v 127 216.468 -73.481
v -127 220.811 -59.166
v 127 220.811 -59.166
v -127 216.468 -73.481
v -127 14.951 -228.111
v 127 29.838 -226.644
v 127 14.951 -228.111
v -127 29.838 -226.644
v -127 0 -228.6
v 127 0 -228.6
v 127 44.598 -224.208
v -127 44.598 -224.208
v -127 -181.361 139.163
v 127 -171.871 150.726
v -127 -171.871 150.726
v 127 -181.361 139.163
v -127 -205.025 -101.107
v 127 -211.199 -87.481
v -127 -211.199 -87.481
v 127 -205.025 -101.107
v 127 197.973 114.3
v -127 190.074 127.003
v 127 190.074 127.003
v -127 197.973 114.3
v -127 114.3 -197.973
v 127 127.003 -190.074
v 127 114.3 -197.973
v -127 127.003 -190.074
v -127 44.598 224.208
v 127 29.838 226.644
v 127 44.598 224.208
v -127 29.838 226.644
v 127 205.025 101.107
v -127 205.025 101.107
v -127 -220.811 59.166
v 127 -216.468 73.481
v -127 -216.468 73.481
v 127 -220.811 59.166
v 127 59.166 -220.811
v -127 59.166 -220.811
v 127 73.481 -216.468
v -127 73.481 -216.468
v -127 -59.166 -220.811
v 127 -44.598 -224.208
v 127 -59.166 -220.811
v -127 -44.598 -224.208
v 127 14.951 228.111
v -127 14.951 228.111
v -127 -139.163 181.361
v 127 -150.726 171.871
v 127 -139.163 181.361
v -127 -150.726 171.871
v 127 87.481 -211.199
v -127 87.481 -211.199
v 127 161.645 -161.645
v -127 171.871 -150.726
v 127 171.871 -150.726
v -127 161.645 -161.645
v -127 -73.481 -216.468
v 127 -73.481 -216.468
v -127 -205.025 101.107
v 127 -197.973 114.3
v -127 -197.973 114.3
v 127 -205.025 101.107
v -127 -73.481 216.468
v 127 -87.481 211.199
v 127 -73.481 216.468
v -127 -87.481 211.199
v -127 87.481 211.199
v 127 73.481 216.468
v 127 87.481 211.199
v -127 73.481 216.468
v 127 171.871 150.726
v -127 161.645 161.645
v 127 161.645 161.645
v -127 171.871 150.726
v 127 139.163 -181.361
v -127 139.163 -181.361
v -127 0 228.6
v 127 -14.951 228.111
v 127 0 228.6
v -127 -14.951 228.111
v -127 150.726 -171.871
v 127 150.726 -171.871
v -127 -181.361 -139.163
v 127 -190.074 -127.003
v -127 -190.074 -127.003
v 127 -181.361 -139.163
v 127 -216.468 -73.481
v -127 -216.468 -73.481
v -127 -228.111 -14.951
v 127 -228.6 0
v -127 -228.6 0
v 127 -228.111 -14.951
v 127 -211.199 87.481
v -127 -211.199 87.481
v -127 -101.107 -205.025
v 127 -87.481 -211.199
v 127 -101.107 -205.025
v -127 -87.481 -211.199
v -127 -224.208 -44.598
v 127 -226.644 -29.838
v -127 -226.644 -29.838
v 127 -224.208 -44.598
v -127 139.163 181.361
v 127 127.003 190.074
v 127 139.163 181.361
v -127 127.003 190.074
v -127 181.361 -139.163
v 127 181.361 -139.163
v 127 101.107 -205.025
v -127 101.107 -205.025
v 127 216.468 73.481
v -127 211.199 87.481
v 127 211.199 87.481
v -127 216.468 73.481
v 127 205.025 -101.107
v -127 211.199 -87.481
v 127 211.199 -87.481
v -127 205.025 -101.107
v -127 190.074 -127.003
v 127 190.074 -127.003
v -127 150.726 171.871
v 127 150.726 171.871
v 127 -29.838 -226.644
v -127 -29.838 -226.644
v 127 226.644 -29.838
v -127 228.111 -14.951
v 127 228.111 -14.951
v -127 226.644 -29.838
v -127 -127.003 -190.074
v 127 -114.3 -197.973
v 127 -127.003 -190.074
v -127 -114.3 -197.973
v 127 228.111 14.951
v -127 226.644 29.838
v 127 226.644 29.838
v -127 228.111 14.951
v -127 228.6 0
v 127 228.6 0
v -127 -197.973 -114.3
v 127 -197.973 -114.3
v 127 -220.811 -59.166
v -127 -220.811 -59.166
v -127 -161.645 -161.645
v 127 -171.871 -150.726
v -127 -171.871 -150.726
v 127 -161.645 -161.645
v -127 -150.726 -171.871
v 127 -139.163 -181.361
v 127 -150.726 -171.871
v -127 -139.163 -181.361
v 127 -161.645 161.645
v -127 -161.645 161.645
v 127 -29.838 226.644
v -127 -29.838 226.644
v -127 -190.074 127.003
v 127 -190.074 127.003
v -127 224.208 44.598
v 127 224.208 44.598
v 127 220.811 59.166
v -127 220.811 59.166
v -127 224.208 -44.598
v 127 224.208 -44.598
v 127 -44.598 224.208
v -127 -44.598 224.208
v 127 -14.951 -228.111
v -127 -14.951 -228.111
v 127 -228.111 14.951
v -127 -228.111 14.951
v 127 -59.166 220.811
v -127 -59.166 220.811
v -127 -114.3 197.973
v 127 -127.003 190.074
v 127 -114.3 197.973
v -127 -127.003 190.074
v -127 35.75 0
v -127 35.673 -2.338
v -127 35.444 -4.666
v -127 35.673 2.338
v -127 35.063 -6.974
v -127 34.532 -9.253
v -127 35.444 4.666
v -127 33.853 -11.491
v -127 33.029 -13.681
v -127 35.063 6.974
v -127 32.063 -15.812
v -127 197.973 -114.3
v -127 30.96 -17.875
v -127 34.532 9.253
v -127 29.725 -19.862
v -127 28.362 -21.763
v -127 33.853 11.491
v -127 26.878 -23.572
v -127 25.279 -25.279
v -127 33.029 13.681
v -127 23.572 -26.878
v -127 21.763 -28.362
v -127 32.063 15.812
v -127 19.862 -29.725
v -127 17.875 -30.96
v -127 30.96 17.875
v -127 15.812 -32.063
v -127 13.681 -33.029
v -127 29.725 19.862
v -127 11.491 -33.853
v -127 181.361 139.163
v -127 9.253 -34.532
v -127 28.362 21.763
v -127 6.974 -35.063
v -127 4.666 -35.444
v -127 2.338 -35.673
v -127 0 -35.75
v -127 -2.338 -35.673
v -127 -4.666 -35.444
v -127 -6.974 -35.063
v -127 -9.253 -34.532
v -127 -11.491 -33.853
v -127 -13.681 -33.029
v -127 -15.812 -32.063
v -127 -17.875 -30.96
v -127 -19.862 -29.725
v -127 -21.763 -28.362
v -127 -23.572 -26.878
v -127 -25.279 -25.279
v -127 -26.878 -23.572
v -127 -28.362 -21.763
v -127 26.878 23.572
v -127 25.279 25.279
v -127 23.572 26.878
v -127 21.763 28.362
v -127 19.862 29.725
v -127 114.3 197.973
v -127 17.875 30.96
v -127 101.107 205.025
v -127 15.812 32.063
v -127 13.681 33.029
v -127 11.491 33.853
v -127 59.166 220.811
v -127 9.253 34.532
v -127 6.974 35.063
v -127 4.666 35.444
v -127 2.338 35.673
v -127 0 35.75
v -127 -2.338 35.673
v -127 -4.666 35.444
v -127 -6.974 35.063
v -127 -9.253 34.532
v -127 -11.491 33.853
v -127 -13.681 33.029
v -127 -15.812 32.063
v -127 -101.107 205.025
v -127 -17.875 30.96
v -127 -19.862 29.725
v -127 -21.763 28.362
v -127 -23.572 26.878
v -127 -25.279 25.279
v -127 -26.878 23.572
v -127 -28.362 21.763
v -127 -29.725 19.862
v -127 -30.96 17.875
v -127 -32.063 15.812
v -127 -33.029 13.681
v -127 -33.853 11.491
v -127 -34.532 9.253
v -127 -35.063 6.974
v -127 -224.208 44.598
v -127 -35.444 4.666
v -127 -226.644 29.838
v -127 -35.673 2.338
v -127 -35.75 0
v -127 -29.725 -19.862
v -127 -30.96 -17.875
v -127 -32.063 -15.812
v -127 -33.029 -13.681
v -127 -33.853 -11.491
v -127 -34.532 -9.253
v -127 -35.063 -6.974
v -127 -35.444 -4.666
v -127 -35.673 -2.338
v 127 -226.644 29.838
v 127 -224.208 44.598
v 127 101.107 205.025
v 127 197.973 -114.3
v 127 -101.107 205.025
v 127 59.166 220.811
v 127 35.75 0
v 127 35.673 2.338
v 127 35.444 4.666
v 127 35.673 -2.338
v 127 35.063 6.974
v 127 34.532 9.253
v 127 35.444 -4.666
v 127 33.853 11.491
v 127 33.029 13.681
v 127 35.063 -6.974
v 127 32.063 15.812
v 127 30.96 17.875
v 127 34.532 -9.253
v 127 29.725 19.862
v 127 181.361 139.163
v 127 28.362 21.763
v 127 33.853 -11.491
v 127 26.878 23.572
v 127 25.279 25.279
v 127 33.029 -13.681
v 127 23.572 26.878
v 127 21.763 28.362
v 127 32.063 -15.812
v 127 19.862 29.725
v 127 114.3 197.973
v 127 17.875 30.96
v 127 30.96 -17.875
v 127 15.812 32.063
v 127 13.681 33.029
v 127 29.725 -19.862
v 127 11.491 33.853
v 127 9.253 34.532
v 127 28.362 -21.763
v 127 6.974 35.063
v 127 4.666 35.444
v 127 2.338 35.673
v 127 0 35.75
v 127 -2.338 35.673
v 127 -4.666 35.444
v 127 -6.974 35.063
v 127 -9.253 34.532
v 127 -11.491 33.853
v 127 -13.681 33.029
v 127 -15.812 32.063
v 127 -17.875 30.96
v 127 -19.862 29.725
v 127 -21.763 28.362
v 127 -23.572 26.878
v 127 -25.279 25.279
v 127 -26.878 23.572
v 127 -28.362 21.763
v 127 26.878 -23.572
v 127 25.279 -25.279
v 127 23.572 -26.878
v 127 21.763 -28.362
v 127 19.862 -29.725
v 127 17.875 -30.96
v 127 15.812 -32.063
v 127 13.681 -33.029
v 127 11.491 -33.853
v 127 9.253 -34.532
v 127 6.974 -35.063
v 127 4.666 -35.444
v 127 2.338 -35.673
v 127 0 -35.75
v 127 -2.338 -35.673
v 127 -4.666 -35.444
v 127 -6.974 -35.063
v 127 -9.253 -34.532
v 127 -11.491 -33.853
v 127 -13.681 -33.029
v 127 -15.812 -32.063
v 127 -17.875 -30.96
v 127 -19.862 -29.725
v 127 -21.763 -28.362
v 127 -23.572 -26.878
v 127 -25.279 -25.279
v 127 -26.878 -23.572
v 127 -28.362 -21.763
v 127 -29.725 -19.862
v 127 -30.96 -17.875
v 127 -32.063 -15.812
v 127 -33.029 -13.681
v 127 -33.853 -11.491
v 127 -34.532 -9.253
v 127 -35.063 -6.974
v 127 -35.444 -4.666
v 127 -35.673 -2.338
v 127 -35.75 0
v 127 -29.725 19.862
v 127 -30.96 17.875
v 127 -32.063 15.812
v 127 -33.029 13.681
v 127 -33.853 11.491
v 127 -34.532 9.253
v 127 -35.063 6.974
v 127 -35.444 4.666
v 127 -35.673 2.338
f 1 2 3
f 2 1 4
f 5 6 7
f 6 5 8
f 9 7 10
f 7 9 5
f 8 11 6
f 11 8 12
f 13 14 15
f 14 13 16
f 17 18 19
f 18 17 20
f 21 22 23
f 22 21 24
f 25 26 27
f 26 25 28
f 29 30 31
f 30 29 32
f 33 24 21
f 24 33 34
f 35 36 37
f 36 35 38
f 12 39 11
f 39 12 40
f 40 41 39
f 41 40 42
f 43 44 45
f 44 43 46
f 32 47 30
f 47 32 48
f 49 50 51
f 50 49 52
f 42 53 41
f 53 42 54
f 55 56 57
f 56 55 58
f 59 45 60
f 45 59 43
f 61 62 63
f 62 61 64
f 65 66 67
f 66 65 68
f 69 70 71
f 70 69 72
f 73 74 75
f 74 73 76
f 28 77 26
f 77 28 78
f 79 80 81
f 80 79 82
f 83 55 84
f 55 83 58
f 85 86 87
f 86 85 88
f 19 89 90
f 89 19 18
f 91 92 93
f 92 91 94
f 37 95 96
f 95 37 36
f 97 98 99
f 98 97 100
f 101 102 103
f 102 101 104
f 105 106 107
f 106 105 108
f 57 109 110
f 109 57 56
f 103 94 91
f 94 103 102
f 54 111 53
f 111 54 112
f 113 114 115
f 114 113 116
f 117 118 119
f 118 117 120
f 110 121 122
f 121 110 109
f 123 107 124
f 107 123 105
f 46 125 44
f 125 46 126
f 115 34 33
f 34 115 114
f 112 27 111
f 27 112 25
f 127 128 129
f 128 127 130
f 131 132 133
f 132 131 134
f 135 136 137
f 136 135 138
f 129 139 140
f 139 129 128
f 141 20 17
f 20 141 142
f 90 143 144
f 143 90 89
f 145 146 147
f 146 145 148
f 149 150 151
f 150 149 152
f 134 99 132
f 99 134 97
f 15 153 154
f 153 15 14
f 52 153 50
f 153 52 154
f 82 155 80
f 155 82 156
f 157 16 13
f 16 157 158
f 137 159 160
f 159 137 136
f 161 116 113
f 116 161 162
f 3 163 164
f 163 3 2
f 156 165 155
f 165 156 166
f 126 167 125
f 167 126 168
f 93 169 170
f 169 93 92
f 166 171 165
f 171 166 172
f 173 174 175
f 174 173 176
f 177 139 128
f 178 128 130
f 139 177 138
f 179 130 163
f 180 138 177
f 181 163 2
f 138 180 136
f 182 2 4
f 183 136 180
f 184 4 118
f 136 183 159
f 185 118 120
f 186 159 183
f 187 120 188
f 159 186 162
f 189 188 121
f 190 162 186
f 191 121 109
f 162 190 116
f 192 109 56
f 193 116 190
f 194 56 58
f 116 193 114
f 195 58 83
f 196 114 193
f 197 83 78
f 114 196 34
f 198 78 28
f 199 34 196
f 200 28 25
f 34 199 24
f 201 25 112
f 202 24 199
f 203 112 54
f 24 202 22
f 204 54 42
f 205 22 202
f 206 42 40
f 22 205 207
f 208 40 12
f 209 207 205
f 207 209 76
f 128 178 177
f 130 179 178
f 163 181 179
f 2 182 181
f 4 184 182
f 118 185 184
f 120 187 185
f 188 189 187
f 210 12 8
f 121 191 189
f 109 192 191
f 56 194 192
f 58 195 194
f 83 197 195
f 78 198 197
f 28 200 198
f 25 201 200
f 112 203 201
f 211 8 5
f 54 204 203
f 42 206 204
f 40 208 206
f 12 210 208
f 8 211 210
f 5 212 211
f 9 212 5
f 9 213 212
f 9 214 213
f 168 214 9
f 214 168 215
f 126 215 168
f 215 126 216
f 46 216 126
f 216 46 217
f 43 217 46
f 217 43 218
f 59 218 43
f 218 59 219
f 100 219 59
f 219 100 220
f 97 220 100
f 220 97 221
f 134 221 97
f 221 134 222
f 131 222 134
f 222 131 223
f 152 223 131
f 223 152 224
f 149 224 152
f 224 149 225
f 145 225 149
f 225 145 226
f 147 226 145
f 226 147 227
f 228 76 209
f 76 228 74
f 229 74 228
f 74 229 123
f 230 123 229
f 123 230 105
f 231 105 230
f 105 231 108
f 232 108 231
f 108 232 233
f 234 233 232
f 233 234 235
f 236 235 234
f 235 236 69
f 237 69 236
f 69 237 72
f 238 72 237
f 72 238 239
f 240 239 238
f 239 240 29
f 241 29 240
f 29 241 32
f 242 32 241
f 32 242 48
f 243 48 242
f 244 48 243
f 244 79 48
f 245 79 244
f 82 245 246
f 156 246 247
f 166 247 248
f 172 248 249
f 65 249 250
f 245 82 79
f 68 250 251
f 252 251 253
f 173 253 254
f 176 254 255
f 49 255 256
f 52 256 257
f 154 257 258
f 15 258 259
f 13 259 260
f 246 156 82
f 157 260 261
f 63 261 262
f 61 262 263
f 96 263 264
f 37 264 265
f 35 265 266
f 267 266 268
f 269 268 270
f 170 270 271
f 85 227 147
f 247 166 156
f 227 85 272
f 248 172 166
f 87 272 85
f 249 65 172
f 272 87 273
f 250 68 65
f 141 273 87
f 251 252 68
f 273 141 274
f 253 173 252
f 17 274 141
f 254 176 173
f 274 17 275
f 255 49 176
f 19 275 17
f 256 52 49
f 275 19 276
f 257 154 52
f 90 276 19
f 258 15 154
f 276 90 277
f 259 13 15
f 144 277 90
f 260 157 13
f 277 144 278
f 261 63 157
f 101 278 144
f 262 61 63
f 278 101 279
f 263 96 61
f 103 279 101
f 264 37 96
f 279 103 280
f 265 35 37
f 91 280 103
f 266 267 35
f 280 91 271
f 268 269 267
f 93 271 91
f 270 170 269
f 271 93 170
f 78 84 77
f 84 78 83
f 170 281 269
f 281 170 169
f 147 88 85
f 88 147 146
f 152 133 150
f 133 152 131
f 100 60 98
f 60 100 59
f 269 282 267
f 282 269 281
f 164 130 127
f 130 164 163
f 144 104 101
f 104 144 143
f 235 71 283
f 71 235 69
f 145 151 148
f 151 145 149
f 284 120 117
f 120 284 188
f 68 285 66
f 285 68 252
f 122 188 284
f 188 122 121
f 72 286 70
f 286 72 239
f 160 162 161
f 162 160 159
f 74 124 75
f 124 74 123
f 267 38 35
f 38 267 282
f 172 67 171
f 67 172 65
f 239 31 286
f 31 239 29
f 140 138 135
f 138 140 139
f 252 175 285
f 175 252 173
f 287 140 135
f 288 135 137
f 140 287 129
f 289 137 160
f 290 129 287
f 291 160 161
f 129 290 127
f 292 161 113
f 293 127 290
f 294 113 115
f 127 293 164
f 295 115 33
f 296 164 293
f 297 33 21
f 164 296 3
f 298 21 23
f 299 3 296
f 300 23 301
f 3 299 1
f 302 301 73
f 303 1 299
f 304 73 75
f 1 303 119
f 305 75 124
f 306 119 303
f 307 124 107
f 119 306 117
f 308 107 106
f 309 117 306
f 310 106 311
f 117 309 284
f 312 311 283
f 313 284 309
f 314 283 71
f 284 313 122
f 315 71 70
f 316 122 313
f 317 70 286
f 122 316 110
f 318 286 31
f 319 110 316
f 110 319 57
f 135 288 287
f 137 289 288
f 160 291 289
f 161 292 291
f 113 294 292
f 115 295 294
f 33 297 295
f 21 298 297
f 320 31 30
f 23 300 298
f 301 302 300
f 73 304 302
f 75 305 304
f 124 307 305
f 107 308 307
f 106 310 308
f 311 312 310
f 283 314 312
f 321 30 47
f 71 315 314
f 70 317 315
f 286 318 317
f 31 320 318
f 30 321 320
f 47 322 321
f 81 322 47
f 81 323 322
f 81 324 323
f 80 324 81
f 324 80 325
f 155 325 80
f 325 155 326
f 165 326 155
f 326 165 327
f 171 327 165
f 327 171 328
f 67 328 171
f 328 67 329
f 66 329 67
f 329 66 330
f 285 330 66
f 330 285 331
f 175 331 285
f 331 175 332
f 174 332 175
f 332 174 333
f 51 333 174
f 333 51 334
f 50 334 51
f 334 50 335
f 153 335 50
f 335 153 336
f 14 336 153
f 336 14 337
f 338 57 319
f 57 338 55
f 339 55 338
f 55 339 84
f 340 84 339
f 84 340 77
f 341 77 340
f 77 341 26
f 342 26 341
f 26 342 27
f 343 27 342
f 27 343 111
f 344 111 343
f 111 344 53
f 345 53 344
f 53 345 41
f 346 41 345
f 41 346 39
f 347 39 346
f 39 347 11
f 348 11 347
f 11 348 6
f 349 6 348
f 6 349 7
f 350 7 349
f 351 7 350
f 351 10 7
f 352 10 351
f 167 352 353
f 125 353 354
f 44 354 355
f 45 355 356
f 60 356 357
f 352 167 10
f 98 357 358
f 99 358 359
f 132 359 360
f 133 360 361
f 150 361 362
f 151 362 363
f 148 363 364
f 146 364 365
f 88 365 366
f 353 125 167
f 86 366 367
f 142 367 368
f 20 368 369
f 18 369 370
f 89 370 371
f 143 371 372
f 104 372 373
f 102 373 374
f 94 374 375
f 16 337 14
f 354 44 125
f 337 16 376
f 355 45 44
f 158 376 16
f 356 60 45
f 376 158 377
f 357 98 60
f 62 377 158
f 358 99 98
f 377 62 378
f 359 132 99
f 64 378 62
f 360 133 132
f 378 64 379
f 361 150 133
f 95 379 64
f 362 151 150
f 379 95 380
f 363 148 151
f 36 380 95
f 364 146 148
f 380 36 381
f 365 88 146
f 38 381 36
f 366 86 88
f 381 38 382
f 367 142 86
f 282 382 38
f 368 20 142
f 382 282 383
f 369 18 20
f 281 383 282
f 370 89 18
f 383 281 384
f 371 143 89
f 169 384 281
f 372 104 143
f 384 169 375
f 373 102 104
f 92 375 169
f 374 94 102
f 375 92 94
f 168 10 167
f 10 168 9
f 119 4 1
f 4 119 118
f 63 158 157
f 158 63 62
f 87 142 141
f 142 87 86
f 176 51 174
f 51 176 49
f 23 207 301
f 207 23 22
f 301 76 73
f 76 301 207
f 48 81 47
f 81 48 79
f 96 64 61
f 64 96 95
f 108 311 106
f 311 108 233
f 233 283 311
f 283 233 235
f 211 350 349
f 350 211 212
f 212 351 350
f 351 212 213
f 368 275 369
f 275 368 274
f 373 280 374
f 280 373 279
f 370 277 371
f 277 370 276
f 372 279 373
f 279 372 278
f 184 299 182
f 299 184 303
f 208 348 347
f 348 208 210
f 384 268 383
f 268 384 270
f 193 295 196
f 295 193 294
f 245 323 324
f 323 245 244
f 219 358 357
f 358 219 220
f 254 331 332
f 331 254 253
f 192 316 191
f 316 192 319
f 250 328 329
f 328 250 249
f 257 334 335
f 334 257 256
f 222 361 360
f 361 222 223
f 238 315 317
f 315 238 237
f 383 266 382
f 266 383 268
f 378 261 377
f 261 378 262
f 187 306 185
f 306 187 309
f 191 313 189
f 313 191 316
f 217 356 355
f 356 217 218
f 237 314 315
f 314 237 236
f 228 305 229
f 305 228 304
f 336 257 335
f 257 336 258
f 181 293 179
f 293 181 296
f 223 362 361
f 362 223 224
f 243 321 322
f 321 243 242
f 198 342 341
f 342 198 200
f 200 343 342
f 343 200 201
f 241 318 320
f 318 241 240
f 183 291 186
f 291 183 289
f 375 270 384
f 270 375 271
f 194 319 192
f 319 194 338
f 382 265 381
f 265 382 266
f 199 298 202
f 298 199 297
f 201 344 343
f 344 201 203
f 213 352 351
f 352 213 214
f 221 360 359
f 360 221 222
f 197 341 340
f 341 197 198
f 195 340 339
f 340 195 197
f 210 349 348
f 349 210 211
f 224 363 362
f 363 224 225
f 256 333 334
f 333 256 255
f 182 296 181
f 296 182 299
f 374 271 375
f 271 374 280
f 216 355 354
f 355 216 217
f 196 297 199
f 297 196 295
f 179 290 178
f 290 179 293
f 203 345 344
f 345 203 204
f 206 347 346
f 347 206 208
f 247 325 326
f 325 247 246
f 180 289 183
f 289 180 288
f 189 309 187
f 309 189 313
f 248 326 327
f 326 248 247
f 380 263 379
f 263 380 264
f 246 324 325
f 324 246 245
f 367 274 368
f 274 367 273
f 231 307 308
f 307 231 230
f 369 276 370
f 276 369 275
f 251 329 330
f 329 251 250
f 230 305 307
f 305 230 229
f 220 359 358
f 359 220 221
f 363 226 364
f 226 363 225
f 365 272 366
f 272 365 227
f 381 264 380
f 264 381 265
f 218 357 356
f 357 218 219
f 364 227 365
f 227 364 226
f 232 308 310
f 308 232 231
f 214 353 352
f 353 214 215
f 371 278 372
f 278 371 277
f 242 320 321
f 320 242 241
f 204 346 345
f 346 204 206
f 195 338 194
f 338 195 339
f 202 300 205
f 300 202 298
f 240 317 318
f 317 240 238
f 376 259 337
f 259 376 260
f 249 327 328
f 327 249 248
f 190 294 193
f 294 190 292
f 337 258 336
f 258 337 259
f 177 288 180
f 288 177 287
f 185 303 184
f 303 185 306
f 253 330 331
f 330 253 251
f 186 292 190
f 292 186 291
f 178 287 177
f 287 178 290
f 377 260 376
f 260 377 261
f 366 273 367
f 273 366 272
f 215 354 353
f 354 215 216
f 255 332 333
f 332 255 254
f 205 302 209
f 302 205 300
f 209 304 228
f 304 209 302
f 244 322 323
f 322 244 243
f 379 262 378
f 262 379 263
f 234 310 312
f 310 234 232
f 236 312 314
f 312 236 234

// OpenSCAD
// Generated documentary F1 envelope proxy.
// Not manufacturing geometry, not dimensionally validated, not SimReady.
proxy_id = "COMP-FUCHS-37028.011";
$fn = 96;

rim_diameter_mm = 457.2;
rim_width_mm = 254;
centre_bore_mm = 71.5;

rotate([0, 90, 0])
difference() {
    cylinder(h = rim_width_mm, d = rim_diameter_mm, center = true);
    cylinder(h = rim_width_mm + 2, d = centre_bore_mm, center = true);
}
